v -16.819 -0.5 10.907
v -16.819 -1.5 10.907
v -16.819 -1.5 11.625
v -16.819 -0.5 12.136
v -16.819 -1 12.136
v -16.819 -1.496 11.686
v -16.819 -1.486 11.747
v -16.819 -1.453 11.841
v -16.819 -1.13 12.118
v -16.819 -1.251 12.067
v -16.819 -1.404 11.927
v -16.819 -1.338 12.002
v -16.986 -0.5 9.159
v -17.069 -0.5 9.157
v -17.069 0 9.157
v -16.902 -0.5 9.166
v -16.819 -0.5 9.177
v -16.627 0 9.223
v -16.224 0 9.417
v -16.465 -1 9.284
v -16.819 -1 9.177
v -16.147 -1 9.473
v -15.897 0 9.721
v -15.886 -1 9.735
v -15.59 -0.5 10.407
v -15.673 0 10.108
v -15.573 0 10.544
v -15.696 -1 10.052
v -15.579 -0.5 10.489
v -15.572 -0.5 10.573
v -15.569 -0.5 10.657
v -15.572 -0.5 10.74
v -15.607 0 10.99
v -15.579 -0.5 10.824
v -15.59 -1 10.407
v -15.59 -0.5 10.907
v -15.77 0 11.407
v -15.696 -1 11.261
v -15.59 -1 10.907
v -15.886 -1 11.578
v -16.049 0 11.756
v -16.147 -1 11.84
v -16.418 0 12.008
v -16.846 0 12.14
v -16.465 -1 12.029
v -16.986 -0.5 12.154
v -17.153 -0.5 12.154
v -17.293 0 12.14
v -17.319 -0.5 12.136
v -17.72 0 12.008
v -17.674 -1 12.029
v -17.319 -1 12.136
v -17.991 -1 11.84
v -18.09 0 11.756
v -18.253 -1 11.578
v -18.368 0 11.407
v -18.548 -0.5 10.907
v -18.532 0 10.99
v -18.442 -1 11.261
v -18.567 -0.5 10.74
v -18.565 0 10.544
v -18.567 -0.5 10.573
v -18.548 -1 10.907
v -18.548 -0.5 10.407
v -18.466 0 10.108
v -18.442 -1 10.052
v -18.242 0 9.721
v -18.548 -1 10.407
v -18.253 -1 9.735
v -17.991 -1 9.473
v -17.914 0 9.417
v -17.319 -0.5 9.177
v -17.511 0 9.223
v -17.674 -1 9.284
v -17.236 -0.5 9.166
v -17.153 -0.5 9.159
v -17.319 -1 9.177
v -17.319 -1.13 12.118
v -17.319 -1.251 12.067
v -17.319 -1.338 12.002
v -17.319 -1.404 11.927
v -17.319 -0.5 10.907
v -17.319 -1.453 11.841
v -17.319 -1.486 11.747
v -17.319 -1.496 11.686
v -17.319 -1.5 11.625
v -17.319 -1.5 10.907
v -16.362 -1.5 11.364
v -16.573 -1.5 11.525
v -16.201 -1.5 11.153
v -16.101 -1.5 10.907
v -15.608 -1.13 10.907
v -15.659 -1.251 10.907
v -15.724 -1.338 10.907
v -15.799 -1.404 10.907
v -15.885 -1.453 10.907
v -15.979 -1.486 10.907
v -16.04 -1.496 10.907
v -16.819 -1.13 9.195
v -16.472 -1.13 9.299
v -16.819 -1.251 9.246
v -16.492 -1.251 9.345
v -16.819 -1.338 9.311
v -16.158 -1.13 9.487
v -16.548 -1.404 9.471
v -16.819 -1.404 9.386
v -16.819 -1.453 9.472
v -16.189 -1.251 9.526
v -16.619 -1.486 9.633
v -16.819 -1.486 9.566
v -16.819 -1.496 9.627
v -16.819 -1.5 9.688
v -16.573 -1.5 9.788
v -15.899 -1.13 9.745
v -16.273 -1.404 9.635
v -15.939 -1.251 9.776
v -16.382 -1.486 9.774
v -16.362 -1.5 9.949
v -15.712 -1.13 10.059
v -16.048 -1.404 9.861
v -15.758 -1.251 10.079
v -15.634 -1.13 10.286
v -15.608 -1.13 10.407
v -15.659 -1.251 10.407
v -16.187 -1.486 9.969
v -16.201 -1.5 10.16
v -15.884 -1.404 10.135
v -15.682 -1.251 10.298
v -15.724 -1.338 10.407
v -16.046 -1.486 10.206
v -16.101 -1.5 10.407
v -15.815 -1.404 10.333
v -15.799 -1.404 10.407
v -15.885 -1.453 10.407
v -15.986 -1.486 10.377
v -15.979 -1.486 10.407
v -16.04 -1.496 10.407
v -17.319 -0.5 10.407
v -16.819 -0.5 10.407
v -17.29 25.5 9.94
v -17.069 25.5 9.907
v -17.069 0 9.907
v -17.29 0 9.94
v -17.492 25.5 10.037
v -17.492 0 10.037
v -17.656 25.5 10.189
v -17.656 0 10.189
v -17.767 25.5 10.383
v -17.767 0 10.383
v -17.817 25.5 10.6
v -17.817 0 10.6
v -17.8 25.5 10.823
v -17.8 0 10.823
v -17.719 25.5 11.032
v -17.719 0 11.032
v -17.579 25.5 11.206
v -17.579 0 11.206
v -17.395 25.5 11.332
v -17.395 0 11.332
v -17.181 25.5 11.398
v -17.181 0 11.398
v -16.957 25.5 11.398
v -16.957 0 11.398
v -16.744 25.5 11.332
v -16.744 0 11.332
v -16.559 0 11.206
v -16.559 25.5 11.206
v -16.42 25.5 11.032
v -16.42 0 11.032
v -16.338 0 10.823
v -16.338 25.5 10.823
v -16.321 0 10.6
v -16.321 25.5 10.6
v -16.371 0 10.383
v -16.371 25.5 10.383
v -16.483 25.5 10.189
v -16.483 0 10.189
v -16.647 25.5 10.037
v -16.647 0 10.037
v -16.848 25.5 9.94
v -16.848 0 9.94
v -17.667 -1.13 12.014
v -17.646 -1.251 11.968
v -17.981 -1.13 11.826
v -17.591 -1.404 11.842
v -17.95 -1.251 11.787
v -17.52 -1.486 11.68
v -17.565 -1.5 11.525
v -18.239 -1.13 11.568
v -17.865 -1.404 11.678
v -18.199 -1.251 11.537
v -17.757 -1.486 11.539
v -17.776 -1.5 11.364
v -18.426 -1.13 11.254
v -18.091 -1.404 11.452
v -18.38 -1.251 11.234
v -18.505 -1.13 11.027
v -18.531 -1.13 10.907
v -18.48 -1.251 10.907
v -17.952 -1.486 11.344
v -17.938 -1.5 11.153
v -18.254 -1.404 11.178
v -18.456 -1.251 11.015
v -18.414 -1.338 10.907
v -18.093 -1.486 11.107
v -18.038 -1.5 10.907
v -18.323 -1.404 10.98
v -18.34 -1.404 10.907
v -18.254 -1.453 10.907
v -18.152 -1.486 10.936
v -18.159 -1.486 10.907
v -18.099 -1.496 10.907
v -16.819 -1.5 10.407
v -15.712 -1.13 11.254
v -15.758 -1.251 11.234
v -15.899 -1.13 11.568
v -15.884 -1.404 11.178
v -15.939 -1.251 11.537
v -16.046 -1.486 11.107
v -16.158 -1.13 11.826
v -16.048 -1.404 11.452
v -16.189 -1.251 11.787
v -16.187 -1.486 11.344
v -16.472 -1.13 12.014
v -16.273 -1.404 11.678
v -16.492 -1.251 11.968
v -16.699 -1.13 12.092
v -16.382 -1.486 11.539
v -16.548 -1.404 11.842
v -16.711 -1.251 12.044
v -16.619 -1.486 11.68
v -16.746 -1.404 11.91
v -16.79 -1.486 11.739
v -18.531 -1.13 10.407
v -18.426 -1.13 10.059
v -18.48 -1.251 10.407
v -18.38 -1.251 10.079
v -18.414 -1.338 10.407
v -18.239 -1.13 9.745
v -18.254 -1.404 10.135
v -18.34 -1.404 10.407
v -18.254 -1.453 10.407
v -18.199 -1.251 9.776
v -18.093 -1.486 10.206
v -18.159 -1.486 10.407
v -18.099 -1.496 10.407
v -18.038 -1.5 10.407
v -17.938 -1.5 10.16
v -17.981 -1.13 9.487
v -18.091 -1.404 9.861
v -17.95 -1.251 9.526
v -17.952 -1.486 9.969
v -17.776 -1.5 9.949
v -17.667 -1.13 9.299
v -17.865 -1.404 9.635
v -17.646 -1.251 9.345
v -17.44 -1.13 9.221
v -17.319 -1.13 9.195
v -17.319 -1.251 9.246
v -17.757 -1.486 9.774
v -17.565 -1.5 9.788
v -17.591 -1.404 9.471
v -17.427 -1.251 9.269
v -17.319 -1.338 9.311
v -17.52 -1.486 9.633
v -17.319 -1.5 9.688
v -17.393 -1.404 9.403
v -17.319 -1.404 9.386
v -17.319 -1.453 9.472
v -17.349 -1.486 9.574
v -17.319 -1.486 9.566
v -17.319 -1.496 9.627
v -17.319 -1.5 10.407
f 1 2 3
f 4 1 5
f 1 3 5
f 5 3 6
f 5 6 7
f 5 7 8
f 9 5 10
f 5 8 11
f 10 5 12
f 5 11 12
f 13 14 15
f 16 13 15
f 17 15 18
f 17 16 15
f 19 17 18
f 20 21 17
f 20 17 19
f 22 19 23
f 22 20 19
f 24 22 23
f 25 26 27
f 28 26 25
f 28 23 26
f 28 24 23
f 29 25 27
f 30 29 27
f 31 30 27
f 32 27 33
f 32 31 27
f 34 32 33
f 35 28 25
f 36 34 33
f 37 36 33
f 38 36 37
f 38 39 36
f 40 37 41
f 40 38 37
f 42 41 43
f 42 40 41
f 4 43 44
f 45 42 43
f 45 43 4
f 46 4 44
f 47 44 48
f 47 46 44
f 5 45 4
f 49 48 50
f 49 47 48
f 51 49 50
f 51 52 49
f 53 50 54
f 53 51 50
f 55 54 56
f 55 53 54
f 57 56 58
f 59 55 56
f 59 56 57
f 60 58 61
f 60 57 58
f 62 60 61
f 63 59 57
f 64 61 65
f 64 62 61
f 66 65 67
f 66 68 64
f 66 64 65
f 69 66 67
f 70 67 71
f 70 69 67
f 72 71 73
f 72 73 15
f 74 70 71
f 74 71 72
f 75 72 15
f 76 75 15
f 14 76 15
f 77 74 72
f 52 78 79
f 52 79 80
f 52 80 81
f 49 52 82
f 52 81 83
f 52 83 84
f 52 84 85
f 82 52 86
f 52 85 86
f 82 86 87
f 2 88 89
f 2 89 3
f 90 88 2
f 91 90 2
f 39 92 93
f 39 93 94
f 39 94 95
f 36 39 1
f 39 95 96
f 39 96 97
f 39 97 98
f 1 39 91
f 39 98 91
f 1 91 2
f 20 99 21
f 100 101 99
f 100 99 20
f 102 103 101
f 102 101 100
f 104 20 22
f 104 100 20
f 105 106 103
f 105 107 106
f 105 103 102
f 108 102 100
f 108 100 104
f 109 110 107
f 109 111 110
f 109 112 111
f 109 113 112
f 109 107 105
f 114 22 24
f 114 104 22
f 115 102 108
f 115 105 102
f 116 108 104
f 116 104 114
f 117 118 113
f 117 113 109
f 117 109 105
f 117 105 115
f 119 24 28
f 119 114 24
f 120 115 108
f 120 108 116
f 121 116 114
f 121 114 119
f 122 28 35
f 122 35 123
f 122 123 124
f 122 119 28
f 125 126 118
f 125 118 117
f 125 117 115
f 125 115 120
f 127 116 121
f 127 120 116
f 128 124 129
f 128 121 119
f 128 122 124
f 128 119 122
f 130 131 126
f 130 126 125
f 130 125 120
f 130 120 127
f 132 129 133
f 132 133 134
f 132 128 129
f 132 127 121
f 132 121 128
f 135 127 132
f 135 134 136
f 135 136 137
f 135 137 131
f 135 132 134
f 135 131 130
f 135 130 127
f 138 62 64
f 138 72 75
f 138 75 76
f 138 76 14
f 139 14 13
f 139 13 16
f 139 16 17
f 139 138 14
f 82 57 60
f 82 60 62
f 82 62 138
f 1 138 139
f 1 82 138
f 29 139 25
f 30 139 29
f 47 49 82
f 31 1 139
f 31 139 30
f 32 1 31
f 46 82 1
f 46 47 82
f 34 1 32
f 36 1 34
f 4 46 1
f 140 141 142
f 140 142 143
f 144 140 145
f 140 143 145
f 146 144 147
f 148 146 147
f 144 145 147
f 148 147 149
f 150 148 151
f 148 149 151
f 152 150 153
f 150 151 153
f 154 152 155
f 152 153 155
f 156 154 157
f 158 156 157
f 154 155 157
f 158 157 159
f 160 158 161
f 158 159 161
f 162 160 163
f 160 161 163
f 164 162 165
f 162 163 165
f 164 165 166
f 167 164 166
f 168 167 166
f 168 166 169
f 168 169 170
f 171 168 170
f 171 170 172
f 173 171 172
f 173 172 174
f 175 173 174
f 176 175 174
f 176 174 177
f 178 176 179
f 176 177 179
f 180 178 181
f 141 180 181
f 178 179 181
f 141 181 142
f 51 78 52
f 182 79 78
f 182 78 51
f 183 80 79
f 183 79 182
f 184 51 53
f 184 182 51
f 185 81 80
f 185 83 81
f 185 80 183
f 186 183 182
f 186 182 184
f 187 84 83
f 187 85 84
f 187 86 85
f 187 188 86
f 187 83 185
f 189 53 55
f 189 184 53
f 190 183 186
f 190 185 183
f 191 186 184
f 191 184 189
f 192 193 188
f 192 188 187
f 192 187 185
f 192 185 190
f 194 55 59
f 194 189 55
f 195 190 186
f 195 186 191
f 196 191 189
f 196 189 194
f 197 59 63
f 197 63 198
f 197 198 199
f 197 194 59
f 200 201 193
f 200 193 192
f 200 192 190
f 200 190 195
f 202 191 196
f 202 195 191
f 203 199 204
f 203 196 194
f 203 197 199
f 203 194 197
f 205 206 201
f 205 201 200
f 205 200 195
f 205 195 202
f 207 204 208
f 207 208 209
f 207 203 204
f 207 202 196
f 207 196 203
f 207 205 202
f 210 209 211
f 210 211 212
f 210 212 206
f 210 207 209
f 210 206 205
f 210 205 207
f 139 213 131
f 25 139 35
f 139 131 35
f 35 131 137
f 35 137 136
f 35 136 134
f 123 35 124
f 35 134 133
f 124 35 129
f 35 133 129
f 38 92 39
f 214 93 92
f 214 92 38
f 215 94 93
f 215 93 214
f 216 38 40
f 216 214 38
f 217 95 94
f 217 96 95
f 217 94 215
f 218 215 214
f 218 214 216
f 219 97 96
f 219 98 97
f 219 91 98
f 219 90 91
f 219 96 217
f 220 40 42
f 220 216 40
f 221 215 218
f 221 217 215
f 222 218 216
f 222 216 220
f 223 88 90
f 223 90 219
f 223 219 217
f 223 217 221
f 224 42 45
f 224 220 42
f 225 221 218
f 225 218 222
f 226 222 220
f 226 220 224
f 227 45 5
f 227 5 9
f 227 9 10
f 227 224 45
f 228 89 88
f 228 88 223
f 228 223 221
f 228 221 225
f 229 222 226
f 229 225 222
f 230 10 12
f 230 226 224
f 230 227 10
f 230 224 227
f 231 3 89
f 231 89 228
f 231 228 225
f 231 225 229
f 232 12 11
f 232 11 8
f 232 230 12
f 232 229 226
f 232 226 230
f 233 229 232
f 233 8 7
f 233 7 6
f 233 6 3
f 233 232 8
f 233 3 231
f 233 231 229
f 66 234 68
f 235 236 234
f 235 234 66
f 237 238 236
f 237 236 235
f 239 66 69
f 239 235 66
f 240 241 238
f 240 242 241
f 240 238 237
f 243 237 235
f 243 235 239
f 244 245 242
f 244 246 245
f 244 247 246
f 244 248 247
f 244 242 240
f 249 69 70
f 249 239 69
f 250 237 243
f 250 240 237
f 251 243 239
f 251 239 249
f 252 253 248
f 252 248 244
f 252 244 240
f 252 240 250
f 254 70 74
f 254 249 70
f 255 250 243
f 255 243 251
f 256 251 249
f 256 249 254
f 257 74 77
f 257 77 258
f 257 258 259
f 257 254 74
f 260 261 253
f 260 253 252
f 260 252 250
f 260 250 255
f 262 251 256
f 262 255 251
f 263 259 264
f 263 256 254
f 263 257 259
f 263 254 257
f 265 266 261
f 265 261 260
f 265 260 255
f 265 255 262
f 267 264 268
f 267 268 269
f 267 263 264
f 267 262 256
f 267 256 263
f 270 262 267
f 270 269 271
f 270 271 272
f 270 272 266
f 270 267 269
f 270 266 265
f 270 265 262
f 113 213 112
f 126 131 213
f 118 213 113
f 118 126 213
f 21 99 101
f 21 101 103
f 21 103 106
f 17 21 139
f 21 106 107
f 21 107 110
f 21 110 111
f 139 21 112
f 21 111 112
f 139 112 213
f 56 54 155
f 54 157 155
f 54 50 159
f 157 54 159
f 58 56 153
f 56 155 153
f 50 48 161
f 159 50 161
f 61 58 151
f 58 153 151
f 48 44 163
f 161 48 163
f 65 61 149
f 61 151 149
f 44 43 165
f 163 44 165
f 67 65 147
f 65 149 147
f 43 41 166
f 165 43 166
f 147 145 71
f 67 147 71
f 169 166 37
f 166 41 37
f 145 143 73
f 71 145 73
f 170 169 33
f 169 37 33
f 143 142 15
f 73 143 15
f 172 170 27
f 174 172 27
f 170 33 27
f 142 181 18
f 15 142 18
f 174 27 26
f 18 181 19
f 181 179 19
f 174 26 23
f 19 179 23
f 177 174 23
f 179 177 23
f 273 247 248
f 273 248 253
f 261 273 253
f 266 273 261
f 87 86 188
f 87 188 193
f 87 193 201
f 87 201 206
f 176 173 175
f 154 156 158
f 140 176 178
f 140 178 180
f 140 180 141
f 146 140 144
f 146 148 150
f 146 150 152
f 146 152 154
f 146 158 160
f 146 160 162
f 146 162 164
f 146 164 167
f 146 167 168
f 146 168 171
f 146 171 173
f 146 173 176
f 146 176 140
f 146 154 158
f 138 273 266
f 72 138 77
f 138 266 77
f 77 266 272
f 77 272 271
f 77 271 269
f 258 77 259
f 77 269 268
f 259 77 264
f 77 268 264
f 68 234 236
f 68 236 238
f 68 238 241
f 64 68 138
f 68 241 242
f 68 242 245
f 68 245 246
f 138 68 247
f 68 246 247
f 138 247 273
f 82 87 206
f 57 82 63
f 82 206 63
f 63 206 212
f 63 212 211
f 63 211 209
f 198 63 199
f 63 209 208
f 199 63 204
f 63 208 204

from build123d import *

# Parameters (mm, degrees)
ESQUISSE1_R             = 1.5
BOSS_EXTRU_1_DEPTH      = 1.5
ESQUISSE2_R             = 0.75
BOSS_EXTRU_2_DEPTH      = 25.5
ESQUISSE3_W             = 0.5
ESQUISSE3_H             = 0.5
ENL_V_MAT_EXTRU_1_DEPTH = 1
CONG_1_R                = 0.5


with BuildPart() as part:
    # Esquisse1 → Boss.-Extru.1 (new body)
    with BuildSketch(Plane.XZ.offset(1.5)):
        with Locations(Location((-17.069271079, 10.656506254, 0), (0, 0, 270))):
            Circle(ESQUISSE1_R)
    extrude(amount=-BOSS_EXTRU_1_DEPTH)

    # Esquisse2 → Boss.-Extru.2 (add)
    with BuildSketch(Plane(origin=(0, 0, 0), x_dir=(1, 0, 0), z_dir=(0, 1, 0))):
        with Locations(Location((-17.069271079, -10.656506254, 0), (0, 0, 90))):
            Circle(ESQUISSE2_R)
    extrude(amount=BOSS_EXTRU_2_DEPTH)

    # Esquisse3 → Enlèv. mat.-Extru.1 (cut)
    with BuildSketch(Plane.XZ.offset(1.5)):
        with BuildLine():
            Line((-16.819271079, 9.177486308), (-16.819271079, 10.406506254))
            Line((-16.819271079, 10.406506254), (-17.319271079, 10.406506254))
            Line((-17.319271079, 10.406506254), (-17.319271079, 9.177486308))
            ThreePointArc((-17.319271079, 9.177486308), (-17.069271079, 9.156506254), (-16.819271079, 9.177486308))
        make_face()
        with BuildLine():
            Line((-16.819271079, 10.906506254), (-16.819271079, 12.1355262))
            ThreePointArc((-16.819271079, 12.1355262), (-17.069271079, 12.156506254), (-17.319271079, 12.1355262))
            Line((-17.319271079, 12.1355262), (-17.319271079, 10.906506254))
            Line((-17.319271079, 10.906506254), (-16.819271079, 10.906506254))
        make_face()
        with BuildLine():
            Line((-15.590251133, 10.906506254), (-16.819271079, 10.906506254))
            Line((-16.819271079, 10.906506254), (-16.819271079, 10.406506254))
            Line((-16.819271079, 10.406506254), (-15.590251133, 10.406506254))
            ThreePointArc((-15.590251133, 10.406506254), (-15.574525295, 10.531066863), (-15.569271079, 10.656506254))
            ThreePointArc((-15.569271079, 10.656506254), (-15.574525295, 10.781945644), (-15.590251133, 10.906506254))
        make_face()
        with BuildLine():
            Line((-17.319271079, 10.406506254), (-17.319271079, 10.906506254))
            Line((-17.319271079, 10.906506254), (-18.548291025, 10.906506254))
            ThreePointArc((-18.548291025, 10.906506254), (-18.569271079, 10.656506254), (-18.548291025, 10.406506254))
            Line((-18.548291025, 10.406506254), (-17.319271079, 10.406506254))
        make_face()
        with Locations((-17.069271079, 10.656506254)):
            Rectangle(ESQUISSE3_W, ESQUISSE3_H)
    extrude(amount=-ENL_V_MAT_EXTRU_1_DEPTH, mode=Mode.SUBTRACT)

    # Congé1
    cong_1_edges = [part.edges().sort_by_distance(p)[0] for p in [
        (-16.008610907, -1.5, 11.717166426),
        (-18.129931251, -1.5, 11.717166426),
        (-18.129931251, -1.5, 9.595846082),
        (-16.008610907, -1.5, 9.595846082),
    ]]
    fillet(cong_1_edges, radius=CONG_1_R)


solid = part.part
